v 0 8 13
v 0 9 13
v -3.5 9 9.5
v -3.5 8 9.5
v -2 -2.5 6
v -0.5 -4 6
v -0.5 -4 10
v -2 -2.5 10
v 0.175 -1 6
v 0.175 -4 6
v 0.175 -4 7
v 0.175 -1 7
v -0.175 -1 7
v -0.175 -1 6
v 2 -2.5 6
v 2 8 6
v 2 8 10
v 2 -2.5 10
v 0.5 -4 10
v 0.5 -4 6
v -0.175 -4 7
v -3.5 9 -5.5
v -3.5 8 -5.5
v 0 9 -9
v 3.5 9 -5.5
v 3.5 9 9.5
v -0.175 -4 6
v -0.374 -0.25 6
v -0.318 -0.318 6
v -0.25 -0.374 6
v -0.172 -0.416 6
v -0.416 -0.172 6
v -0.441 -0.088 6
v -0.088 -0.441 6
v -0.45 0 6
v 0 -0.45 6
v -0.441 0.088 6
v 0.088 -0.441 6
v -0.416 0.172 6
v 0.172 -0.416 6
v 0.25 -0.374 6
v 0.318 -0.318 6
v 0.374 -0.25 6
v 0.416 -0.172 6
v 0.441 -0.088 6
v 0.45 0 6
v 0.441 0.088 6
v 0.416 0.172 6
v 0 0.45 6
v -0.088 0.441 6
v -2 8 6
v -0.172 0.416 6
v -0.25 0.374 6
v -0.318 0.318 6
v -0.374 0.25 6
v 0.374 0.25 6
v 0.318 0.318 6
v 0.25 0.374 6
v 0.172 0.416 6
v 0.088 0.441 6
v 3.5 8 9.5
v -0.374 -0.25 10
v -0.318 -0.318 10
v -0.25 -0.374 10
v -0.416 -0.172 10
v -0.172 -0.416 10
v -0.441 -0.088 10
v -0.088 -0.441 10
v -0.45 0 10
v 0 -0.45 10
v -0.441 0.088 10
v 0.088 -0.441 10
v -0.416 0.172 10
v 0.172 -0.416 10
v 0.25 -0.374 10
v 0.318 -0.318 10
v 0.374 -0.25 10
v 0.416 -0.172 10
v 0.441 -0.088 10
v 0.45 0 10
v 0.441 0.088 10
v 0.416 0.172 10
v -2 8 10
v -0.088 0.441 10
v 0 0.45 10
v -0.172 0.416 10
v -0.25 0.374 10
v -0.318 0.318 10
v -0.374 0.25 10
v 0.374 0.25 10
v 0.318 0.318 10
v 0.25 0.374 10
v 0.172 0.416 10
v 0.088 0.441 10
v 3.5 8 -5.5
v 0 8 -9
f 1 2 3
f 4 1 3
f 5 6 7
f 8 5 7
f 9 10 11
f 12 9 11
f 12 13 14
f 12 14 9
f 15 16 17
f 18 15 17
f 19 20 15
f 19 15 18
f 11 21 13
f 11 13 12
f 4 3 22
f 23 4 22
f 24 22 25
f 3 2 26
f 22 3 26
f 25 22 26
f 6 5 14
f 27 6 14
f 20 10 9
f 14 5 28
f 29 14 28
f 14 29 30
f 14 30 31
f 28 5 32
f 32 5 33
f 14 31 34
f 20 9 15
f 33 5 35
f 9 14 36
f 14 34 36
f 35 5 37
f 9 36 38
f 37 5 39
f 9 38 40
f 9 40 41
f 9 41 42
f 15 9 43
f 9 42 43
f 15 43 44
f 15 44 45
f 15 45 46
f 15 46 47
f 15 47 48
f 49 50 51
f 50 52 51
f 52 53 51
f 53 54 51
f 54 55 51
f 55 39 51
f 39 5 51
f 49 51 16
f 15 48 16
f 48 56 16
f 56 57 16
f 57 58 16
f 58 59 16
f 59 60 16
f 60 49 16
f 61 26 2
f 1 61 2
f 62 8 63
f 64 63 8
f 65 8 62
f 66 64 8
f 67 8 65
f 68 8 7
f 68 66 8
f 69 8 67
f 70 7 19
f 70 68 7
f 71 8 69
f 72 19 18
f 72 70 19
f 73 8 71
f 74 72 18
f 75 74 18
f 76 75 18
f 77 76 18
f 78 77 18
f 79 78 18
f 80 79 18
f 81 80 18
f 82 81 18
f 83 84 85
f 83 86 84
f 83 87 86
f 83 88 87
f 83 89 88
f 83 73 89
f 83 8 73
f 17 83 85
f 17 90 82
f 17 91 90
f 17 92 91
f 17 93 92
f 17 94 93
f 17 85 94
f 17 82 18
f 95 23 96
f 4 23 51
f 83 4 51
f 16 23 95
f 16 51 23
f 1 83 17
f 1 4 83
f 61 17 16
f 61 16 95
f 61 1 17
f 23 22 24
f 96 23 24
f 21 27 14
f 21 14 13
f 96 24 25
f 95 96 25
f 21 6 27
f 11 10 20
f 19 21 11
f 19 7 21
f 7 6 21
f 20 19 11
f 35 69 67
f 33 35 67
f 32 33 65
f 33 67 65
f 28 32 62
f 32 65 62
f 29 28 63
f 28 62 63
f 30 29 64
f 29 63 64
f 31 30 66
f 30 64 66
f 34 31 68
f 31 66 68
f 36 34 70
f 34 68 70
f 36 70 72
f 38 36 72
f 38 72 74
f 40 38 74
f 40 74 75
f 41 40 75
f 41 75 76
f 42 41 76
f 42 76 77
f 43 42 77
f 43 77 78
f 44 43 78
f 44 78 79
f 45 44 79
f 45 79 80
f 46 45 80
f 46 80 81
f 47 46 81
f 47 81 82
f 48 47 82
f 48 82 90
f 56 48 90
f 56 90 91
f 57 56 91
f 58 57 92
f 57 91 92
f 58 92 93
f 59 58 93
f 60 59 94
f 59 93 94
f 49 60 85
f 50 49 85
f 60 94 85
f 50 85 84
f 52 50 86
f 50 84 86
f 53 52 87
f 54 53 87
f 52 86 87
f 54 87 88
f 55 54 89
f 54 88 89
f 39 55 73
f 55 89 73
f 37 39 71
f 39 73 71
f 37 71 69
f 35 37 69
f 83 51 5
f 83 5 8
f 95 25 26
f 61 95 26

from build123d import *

# Parameters (mm, degrees)
PAD005_DEPTH            = 1
SKETCH006_W             = 4
SKETCH006_H             = 4
PAD006_DEPTH            = 12
SKETCH007_R             = 0.45
POCKET_DEPTH            = 10
SKETCH021_W             = 0.35
SKETCH021_H             = 1
POCKET004_DEPTH         = 3
CHAMFER_SIZE            = 1.5
BODY003_PLACEMENT_ANGLE = 90


with BuildPart() as part:
    # Sketch005 → Pad005 (new body)
    with BuildSketch(Plane.XY):
        Polygon((0, -11), (3.5, -7.5), (3.5, 7.5), (0, 11), (-3.5, 7.5), (-3.5, -7.5), align=None)
    extrude(amount=PAD005_DEPTH)

    # Sketch006 (on Face8 of Pad005) → Pad006 (join)
    with BuildSketch(Plane.XY.offset(1)):
        with Locations((0, 6)):
            Rectangle(SKETCH006_W, SKETCH006_H)
    extrude(amount=PAD006_DEPTH)

    # Sketch007 (on Face12 of Pad006) → Pocket (cut)
    with BuildSketch(Plane(origin=(0, 8, 0), x_dir=(-1, 0, 0), z_dir=(0, 1, 0))):
        with Locations((0, 9)):
            Circle(SKETCH007_R)
    extrude(amount=-POCKET_DEPTH, mode=Mode.SUBTRACT)

    # Sketch021 (on Face13 of Pocket) → Pocket004 (cut)
    with BuildSketch(Plane.XY.offset(13)):
        with Locations((0, 4.5)):
            Rectangle(SKETCH021_W, SKETCH021_H)
    extrude(amount=-POCKET004_DEPTH, mode=Mode.SUBTRACT)

    # Chamfer
    chamfer_edges = [part.edges().sort_by_distance(p)[0] for p in [
        (2, 6, 13),
        (-2, 6, 13),
    ]]
    chamfer(chamfer_edges, length=CHAMFER_SIZE)


with BuildPart() as part_1:
    # Body003 placement: moved
    add(part.part.moved(Location((0, 9, 2))).rotate(Axis((0, 9, 2), (1, 0, 0)), BODY003_PLACEMENT_ANGLE))


solid = part_1.part
